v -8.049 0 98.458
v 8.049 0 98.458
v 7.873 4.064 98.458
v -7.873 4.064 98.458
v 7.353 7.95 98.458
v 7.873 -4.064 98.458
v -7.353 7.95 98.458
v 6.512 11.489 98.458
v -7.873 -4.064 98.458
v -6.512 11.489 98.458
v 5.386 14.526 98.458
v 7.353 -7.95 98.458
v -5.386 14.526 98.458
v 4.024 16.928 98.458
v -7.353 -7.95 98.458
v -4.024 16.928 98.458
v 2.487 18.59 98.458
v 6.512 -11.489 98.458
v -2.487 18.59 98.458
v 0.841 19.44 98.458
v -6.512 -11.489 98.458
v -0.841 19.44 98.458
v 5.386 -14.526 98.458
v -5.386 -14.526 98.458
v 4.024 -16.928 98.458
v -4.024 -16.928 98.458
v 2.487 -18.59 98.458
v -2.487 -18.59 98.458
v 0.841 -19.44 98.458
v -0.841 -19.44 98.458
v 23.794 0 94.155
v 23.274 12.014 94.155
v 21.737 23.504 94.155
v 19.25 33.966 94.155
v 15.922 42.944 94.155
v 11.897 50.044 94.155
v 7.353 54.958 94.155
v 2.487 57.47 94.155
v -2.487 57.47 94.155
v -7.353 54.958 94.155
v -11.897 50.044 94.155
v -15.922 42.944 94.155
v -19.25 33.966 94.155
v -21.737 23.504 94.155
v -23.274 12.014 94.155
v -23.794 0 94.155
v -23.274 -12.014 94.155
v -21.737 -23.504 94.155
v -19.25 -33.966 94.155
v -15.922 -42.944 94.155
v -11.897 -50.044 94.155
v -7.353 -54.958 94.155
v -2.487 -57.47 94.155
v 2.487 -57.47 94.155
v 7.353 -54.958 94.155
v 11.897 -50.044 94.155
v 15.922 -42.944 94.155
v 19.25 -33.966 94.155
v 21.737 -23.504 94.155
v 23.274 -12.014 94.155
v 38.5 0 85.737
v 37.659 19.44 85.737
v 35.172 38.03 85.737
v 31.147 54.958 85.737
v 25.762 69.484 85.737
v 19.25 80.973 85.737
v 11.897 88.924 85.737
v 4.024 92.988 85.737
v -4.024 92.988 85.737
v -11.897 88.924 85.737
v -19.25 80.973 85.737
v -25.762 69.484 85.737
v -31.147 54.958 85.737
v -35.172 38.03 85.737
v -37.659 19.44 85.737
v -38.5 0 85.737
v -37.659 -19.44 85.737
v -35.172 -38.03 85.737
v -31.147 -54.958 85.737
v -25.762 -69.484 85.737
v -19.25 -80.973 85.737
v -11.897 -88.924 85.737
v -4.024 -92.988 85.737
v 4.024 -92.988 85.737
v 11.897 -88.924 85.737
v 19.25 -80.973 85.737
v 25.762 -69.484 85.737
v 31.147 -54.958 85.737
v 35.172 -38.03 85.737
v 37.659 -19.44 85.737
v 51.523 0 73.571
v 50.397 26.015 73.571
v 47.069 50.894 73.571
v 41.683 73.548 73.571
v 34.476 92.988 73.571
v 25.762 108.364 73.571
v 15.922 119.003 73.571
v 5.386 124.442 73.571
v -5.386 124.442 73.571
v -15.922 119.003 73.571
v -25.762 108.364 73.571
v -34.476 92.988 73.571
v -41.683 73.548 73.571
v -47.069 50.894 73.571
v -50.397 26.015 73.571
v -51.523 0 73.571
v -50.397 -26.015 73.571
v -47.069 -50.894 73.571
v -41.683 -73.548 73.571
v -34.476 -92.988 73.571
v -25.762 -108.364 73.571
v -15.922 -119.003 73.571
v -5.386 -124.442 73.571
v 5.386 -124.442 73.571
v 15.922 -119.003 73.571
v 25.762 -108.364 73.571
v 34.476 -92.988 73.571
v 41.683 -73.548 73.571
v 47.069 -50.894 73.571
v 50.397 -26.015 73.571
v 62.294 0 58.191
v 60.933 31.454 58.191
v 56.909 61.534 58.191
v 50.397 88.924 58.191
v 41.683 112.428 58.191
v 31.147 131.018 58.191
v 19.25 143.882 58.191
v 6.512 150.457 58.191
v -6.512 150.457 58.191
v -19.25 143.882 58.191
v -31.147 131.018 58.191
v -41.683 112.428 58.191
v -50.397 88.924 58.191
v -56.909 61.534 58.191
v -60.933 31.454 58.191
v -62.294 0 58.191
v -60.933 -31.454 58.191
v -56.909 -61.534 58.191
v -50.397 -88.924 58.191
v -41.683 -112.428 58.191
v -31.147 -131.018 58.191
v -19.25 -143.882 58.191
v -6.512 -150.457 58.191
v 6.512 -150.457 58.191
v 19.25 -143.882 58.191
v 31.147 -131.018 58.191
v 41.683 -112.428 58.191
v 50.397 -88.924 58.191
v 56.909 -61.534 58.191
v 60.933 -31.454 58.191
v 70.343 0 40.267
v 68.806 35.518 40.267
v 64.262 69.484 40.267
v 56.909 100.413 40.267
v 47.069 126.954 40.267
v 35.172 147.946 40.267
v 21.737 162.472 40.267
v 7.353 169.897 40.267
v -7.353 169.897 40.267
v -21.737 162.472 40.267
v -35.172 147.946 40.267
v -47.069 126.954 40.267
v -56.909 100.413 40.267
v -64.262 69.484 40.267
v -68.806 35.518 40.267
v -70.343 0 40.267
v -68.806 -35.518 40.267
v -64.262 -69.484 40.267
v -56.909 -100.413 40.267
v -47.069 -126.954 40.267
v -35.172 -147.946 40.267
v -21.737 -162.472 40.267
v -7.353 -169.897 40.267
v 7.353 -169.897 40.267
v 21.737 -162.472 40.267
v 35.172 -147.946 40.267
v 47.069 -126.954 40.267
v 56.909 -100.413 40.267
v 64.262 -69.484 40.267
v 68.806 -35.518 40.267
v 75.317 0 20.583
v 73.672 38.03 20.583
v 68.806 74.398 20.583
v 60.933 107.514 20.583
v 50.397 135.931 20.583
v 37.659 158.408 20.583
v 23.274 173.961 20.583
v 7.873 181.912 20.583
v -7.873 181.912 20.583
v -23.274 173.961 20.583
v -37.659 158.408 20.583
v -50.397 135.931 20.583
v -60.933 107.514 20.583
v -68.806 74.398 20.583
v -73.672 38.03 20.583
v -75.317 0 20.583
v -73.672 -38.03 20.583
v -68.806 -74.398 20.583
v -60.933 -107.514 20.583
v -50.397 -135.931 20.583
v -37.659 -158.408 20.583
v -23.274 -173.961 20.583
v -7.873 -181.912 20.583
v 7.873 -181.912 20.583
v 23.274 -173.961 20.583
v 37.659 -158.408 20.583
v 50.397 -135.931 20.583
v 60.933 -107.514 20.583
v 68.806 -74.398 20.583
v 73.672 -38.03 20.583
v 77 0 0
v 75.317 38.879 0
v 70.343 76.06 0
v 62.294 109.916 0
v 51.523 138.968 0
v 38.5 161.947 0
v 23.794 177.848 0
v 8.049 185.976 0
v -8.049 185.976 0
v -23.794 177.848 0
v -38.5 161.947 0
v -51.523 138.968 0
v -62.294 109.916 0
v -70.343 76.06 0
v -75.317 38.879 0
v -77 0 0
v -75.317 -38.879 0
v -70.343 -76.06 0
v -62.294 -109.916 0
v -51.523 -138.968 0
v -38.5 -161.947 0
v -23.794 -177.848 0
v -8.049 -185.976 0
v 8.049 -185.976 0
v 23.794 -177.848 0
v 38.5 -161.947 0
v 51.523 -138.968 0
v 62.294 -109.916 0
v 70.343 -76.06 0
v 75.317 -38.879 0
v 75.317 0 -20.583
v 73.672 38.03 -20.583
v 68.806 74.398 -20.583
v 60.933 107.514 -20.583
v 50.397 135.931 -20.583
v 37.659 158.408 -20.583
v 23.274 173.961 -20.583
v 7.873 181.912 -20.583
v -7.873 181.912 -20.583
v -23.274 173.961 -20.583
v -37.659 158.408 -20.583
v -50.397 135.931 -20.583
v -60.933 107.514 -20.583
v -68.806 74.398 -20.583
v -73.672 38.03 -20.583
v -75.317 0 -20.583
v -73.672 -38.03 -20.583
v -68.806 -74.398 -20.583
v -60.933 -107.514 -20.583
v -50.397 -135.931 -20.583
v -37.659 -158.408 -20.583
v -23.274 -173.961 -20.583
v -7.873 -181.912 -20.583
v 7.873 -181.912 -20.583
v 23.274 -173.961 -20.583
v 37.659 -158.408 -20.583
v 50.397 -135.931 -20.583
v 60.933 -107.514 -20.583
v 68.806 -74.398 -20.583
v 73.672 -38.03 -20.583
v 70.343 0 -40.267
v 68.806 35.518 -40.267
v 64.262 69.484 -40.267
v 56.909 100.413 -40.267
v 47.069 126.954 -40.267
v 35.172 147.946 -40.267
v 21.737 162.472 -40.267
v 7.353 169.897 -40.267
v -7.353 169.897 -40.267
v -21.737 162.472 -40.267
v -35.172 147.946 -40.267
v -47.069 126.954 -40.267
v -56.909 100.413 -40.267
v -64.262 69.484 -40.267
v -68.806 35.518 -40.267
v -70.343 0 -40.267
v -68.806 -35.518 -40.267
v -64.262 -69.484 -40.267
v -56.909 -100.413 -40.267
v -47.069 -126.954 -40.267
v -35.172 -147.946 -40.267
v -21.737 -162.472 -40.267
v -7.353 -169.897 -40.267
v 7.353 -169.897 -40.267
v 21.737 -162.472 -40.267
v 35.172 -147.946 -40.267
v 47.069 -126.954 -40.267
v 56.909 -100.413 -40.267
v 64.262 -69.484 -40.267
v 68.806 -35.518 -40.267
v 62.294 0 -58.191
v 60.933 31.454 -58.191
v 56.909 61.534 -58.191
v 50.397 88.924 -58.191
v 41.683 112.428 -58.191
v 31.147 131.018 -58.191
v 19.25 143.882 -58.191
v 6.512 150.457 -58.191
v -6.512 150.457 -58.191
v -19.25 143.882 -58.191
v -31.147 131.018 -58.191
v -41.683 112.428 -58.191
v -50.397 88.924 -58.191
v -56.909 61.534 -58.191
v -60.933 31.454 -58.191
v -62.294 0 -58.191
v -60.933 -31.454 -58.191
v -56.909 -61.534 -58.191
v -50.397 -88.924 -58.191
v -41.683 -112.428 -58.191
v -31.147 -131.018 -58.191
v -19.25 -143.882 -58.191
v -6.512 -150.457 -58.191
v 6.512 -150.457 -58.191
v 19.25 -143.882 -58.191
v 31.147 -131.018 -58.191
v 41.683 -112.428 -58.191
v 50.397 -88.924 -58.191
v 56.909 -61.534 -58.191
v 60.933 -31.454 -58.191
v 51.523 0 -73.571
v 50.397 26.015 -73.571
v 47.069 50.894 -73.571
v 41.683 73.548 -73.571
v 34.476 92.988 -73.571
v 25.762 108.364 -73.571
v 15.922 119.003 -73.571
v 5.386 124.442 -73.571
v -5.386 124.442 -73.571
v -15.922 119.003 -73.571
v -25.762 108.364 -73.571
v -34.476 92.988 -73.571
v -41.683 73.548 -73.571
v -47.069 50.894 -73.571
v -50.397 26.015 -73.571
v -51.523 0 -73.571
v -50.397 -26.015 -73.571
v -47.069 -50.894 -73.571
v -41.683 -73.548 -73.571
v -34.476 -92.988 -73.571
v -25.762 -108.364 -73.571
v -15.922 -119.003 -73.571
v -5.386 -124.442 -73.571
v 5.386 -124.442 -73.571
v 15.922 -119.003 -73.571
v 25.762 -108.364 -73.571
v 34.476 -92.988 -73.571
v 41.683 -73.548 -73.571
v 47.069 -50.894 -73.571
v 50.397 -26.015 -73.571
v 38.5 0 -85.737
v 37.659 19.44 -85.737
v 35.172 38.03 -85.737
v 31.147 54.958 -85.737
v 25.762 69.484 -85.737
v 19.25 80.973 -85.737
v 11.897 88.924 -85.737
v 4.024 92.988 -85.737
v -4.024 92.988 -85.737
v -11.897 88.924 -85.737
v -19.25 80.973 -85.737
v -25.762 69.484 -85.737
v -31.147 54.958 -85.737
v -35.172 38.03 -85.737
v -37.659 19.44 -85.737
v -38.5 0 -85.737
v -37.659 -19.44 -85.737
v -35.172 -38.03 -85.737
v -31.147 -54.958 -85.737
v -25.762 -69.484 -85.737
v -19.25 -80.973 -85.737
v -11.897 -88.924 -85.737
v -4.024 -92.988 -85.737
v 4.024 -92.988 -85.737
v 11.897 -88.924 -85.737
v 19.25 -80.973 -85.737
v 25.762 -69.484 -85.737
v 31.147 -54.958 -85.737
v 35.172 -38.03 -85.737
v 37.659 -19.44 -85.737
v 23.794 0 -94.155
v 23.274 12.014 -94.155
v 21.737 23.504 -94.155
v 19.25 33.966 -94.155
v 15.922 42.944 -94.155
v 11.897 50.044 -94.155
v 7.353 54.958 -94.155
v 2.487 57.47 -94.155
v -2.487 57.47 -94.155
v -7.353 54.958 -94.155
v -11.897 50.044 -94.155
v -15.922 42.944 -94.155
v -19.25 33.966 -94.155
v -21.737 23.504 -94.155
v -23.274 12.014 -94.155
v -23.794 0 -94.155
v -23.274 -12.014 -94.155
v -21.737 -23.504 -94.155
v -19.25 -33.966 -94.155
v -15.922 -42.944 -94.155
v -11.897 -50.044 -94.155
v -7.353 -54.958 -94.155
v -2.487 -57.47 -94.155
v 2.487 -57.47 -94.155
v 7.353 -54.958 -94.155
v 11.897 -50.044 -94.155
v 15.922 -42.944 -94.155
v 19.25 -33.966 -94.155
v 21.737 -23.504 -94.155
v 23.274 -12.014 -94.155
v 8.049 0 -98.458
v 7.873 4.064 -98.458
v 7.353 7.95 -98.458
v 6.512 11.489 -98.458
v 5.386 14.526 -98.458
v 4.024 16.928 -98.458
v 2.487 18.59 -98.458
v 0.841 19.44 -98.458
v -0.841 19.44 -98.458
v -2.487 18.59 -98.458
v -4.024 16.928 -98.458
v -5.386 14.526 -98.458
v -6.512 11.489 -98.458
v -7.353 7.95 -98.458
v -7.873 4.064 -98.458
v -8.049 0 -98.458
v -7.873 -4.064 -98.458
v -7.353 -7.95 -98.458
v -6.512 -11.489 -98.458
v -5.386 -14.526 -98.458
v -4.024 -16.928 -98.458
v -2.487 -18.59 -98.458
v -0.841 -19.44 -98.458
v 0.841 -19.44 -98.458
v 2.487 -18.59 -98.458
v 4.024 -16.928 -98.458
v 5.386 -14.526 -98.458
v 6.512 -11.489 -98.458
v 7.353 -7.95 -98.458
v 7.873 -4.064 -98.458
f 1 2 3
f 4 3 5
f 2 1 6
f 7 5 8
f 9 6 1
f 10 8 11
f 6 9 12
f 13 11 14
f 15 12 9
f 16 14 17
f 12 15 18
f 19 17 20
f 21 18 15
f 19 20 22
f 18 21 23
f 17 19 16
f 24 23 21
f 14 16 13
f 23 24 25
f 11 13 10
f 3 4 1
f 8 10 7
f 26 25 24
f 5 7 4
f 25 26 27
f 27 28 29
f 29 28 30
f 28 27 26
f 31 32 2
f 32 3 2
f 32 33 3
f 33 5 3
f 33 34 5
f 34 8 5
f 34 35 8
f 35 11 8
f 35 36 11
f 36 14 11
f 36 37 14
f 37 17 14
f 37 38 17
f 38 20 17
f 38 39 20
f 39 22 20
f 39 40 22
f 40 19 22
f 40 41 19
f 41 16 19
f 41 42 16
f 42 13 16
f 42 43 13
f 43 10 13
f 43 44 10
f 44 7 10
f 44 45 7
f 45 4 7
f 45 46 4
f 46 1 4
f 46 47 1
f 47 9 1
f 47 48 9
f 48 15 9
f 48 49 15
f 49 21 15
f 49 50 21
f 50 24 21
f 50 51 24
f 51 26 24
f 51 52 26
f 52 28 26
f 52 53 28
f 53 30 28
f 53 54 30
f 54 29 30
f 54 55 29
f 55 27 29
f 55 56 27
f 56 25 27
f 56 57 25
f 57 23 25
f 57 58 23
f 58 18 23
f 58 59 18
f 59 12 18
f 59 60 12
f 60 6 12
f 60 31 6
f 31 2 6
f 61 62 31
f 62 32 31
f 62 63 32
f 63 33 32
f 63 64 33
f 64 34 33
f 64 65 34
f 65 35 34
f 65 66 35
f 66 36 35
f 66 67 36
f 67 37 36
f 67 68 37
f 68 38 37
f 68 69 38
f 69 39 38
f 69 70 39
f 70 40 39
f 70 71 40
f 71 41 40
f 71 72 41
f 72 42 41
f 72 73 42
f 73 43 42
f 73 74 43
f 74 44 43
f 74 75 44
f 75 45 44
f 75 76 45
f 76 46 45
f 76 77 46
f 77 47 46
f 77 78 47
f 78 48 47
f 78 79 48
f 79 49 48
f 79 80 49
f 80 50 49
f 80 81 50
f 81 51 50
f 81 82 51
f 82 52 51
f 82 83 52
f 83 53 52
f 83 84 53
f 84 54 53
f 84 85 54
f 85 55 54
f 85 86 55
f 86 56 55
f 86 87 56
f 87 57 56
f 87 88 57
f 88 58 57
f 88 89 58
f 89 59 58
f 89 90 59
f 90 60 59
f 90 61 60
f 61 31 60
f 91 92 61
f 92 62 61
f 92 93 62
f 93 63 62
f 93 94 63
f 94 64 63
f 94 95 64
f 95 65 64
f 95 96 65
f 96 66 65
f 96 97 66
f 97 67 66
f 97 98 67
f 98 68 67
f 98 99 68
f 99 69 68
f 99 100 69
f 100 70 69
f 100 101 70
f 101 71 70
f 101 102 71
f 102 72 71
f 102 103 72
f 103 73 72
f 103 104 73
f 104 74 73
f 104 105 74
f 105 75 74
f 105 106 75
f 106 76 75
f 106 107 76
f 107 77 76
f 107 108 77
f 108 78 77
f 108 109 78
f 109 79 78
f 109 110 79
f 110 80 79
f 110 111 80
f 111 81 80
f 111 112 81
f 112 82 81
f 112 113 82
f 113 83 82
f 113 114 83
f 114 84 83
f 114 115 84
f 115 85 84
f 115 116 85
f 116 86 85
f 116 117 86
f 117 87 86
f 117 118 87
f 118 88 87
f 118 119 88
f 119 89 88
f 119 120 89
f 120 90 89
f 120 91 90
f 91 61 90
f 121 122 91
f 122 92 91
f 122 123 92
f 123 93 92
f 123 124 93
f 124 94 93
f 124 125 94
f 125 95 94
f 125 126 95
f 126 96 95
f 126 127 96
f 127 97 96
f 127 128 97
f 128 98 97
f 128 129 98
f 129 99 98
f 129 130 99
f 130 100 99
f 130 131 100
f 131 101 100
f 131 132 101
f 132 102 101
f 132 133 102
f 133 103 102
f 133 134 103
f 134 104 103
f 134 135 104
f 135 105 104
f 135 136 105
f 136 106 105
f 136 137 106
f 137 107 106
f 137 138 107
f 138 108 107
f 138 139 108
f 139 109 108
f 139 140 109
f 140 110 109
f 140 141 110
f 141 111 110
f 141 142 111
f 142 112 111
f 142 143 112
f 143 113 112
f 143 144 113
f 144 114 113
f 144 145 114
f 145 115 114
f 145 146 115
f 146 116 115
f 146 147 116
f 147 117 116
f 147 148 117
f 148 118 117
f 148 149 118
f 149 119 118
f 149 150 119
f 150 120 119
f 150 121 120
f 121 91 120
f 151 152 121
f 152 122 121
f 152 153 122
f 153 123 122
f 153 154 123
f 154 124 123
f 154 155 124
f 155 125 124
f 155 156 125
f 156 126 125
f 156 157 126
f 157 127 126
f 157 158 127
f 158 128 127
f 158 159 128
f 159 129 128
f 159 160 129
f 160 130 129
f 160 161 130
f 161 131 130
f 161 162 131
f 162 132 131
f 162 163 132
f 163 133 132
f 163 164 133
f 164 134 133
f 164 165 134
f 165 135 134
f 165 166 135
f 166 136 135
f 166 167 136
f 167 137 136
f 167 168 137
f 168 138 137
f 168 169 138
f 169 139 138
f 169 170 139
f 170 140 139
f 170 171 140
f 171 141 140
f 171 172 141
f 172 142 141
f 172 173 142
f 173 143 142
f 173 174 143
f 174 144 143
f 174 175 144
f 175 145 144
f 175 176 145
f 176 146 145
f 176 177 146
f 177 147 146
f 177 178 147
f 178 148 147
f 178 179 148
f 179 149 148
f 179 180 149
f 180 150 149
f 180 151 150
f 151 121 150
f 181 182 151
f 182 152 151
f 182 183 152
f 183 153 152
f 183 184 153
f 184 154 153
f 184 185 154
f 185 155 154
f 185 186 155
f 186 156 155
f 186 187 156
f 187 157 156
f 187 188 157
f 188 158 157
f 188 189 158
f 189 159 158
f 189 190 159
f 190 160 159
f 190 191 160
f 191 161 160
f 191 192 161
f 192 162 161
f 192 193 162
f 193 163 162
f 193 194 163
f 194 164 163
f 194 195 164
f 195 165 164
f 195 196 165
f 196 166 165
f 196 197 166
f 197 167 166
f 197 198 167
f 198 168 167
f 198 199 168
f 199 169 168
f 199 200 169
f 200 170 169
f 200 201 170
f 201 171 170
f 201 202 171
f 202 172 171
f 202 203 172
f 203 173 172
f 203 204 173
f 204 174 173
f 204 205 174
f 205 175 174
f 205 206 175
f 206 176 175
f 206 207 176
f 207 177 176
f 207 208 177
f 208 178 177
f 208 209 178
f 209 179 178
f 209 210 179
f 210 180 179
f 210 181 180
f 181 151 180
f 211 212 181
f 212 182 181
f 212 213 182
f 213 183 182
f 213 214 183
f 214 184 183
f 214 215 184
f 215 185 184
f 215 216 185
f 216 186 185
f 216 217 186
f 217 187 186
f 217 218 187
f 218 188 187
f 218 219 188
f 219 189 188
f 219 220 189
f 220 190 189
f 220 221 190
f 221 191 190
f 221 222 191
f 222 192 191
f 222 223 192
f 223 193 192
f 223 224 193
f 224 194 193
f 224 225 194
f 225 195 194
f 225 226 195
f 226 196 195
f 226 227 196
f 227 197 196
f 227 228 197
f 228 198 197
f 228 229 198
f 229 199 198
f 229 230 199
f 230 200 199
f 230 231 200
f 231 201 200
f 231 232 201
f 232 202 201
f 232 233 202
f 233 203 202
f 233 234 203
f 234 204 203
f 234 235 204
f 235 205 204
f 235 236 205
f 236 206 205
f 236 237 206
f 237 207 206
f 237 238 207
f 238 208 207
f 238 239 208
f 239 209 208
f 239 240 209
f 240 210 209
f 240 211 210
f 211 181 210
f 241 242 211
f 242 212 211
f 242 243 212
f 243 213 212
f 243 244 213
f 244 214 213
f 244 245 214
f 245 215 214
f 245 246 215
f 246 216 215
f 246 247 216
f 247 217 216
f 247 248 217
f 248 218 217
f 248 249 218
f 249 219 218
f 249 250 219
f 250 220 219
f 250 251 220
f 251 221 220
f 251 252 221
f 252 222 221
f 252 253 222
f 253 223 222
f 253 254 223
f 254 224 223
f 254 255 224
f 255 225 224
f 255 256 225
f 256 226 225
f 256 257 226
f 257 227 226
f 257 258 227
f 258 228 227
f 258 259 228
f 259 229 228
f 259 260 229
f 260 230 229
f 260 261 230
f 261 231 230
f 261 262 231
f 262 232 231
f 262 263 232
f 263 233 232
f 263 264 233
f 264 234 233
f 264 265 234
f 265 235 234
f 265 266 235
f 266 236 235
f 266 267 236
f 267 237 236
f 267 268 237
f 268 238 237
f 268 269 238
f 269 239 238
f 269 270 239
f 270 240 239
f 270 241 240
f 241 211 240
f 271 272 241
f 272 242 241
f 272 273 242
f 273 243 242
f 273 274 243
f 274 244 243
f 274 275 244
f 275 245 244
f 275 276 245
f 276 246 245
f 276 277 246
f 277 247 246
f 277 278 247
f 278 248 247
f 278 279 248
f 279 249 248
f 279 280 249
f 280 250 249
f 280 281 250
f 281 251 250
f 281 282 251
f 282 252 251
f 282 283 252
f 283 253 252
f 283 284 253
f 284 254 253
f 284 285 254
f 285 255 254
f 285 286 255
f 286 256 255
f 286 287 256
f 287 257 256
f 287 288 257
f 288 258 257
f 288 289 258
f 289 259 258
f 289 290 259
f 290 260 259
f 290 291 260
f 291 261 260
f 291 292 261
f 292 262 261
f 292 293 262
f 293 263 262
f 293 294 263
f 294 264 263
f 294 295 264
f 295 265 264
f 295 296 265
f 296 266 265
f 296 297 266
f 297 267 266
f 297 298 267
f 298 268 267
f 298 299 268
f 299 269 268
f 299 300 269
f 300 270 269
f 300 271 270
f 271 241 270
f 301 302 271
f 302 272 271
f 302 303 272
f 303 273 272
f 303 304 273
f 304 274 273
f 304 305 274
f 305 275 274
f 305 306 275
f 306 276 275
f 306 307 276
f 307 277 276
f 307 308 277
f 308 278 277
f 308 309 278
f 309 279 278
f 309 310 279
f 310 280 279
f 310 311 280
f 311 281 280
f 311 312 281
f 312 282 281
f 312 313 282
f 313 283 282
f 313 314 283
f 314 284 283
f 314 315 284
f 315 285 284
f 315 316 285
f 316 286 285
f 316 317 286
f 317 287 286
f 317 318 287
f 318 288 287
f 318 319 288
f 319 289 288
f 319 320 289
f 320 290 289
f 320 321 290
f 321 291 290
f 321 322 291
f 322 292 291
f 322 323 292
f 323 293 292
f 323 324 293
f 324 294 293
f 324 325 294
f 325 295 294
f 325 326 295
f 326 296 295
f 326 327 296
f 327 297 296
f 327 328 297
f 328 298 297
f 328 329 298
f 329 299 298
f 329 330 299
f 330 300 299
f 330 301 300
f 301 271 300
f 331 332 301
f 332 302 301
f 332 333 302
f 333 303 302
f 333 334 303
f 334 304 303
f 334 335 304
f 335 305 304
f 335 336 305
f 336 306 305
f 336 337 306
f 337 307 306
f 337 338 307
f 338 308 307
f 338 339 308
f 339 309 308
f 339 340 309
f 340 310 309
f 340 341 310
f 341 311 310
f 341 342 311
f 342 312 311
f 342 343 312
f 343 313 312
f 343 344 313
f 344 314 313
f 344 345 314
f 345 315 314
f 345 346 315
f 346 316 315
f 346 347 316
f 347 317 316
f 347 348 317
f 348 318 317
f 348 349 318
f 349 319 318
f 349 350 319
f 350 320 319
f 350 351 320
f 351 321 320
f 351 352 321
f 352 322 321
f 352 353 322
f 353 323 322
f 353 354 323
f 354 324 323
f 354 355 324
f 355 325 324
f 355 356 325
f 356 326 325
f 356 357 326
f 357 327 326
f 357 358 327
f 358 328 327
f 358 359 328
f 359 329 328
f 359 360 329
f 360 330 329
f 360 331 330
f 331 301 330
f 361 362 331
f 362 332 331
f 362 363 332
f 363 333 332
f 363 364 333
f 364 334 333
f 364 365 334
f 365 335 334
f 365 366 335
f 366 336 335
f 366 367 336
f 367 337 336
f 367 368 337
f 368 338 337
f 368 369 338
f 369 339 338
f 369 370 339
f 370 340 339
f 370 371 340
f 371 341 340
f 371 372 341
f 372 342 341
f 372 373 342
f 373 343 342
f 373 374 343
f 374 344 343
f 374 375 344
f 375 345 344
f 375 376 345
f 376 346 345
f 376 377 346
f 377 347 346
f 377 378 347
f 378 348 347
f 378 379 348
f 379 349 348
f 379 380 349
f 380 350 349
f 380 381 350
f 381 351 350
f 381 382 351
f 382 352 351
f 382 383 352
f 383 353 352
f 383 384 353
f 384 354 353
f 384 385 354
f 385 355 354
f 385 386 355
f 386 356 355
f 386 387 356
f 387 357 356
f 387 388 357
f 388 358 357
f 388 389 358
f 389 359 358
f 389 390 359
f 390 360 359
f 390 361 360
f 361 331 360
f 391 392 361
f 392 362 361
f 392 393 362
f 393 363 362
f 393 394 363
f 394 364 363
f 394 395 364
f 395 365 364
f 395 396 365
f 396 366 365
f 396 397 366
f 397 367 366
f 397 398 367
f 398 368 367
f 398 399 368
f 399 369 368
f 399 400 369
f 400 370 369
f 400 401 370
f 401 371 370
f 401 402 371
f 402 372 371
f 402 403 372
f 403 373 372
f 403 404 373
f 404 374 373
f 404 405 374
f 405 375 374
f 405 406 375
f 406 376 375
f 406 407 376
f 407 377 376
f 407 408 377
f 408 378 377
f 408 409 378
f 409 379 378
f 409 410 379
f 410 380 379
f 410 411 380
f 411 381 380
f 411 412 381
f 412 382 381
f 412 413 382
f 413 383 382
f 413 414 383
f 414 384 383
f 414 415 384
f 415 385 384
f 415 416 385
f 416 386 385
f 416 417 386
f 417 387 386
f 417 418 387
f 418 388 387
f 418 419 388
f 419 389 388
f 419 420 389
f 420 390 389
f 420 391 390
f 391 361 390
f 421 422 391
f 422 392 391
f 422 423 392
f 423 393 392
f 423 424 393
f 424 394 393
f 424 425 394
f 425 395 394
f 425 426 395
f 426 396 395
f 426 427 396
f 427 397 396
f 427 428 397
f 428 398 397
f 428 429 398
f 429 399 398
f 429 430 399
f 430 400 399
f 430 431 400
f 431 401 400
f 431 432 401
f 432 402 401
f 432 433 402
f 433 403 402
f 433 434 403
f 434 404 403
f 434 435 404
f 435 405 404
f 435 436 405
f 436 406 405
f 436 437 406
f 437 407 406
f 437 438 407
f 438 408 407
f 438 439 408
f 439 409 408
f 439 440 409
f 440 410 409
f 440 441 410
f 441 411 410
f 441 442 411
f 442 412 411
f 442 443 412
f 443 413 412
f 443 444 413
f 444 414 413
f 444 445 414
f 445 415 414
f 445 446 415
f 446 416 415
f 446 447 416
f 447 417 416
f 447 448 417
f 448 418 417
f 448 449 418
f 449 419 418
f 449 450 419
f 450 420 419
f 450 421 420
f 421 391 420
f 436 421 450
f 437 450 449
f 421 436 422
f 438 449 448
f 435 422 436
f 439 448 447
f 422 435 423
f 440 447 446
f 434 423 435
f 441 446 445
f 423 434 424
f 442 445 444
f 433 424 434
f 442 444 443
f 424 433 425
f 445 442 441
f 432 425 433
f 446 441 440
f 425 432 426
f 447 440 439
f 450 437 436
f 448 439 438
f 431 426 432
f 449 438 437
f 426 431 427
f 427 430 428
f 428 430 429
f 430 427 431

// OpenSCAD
// Generated by SolidPython 1.0.1 on 2020-07-29 00:46:48


scale(v = [7, 17, 9]) {
	sphere(r = 11);
}
/***********************************************
*********      SolidPython code:      **********
************************************************
 
# import packages: SolidPython
from solid import *
from solid.utils import *
from itertools import chain, combinations, permutations


class Resize:

    def __init__(self, scad_file):
        self.scad_file = scad_file
        #self.scad_file = import_scad(scad_file)
        # cone/cylinder param:
        self.r1 = 0
        self.r2 = 0
        self.h = 0
        # rectangular prism param:
        self.w = 0
        self.l = 0
        # ellipse param:
        self.r = 0

    # import OpenScad code (file name corresponds to shape)


    # classify shape + parameters
    def assign(self, param1, param2, param3):
        if self.scad_file == 'cone.scad':
            self.r1 = param1
            self.r2 = param2
            self.h = param3
        elif self.scad_file == 'cylinder.scad':
            self.r1 = param1
            self.r2 = param2
            self.h = param3
        elif self.scad_file == 'rectangularPrism.scad':
            self.h = param1
            self.l = param2
            self.w = param3
        else:
            self.r = param1
            self.h = param2

    # resize parameters
    def iterate(self):
        x = range(3, 20, 2)
        i = 1
        if self.scad_file == 'cone.scad':
            tempList = list(permutations(x, 2))
            for temp in tempList:
                param1 = temp[0]
                param2 = temp[1]
                filepath = 'produced_scad_files/' + 'cone' + str(param1) + '_' + str(param2) + '_' + '.scad'
                scad_render_to_file(cylinder(h=param1, r1=param2, r2=0), filepath)

        elif self.scad_file == 'cylinder.scad':
            tempList = list(permutations(x, 3))
            for temp in tempList:
                param1 = temp[0]
                param2 = temp[1]
                filepath = 'produced_scad_files/' + 'cylinder' + str(param1) + '_' + str(param2) + '_' + '.scad'
                scad_render_to_file(cylinder(h=param1, r1=param2, r2=param2), filepath)

        elif self.scad_file == 'rectangularPrism.scad':
            tempList = list(permutations(x, 3))
            for temp in tempList:
                param1 = temp[0]
                param2 = temp[1]
                param3 = temp[2]
                filepath = 'produced_scad_files/' + 'rectangularPrism' + str(param1) + '_' + str(param2) + '_' + str(
                    param3) + '.scad'
                scad_render_to_file(cube(size=(param1, param2, param3)), filepath)

        elif self.scad_file == 'ellipse.scad':
            tempList = list(permutations(x, 4))
            for temp in tempList:
                param1 = temp[0]
                param2 = temp[1]
                param3 = temp[2]
                param4 = temp[3]
                filepath = 'produced_scad_files/' + 'ellipse' + str(param1) + '_' + str(param2) + '_' + str(param3) + '_' + str(param4) + '.scad'
                scad_render_to_file(scale([param1, param2, param3])(sphere(r=param4)), filepath)

    def render_to_scadfile(self):
        scad_render_to_file(scad, 'example.scad') 
 
************************************************/
